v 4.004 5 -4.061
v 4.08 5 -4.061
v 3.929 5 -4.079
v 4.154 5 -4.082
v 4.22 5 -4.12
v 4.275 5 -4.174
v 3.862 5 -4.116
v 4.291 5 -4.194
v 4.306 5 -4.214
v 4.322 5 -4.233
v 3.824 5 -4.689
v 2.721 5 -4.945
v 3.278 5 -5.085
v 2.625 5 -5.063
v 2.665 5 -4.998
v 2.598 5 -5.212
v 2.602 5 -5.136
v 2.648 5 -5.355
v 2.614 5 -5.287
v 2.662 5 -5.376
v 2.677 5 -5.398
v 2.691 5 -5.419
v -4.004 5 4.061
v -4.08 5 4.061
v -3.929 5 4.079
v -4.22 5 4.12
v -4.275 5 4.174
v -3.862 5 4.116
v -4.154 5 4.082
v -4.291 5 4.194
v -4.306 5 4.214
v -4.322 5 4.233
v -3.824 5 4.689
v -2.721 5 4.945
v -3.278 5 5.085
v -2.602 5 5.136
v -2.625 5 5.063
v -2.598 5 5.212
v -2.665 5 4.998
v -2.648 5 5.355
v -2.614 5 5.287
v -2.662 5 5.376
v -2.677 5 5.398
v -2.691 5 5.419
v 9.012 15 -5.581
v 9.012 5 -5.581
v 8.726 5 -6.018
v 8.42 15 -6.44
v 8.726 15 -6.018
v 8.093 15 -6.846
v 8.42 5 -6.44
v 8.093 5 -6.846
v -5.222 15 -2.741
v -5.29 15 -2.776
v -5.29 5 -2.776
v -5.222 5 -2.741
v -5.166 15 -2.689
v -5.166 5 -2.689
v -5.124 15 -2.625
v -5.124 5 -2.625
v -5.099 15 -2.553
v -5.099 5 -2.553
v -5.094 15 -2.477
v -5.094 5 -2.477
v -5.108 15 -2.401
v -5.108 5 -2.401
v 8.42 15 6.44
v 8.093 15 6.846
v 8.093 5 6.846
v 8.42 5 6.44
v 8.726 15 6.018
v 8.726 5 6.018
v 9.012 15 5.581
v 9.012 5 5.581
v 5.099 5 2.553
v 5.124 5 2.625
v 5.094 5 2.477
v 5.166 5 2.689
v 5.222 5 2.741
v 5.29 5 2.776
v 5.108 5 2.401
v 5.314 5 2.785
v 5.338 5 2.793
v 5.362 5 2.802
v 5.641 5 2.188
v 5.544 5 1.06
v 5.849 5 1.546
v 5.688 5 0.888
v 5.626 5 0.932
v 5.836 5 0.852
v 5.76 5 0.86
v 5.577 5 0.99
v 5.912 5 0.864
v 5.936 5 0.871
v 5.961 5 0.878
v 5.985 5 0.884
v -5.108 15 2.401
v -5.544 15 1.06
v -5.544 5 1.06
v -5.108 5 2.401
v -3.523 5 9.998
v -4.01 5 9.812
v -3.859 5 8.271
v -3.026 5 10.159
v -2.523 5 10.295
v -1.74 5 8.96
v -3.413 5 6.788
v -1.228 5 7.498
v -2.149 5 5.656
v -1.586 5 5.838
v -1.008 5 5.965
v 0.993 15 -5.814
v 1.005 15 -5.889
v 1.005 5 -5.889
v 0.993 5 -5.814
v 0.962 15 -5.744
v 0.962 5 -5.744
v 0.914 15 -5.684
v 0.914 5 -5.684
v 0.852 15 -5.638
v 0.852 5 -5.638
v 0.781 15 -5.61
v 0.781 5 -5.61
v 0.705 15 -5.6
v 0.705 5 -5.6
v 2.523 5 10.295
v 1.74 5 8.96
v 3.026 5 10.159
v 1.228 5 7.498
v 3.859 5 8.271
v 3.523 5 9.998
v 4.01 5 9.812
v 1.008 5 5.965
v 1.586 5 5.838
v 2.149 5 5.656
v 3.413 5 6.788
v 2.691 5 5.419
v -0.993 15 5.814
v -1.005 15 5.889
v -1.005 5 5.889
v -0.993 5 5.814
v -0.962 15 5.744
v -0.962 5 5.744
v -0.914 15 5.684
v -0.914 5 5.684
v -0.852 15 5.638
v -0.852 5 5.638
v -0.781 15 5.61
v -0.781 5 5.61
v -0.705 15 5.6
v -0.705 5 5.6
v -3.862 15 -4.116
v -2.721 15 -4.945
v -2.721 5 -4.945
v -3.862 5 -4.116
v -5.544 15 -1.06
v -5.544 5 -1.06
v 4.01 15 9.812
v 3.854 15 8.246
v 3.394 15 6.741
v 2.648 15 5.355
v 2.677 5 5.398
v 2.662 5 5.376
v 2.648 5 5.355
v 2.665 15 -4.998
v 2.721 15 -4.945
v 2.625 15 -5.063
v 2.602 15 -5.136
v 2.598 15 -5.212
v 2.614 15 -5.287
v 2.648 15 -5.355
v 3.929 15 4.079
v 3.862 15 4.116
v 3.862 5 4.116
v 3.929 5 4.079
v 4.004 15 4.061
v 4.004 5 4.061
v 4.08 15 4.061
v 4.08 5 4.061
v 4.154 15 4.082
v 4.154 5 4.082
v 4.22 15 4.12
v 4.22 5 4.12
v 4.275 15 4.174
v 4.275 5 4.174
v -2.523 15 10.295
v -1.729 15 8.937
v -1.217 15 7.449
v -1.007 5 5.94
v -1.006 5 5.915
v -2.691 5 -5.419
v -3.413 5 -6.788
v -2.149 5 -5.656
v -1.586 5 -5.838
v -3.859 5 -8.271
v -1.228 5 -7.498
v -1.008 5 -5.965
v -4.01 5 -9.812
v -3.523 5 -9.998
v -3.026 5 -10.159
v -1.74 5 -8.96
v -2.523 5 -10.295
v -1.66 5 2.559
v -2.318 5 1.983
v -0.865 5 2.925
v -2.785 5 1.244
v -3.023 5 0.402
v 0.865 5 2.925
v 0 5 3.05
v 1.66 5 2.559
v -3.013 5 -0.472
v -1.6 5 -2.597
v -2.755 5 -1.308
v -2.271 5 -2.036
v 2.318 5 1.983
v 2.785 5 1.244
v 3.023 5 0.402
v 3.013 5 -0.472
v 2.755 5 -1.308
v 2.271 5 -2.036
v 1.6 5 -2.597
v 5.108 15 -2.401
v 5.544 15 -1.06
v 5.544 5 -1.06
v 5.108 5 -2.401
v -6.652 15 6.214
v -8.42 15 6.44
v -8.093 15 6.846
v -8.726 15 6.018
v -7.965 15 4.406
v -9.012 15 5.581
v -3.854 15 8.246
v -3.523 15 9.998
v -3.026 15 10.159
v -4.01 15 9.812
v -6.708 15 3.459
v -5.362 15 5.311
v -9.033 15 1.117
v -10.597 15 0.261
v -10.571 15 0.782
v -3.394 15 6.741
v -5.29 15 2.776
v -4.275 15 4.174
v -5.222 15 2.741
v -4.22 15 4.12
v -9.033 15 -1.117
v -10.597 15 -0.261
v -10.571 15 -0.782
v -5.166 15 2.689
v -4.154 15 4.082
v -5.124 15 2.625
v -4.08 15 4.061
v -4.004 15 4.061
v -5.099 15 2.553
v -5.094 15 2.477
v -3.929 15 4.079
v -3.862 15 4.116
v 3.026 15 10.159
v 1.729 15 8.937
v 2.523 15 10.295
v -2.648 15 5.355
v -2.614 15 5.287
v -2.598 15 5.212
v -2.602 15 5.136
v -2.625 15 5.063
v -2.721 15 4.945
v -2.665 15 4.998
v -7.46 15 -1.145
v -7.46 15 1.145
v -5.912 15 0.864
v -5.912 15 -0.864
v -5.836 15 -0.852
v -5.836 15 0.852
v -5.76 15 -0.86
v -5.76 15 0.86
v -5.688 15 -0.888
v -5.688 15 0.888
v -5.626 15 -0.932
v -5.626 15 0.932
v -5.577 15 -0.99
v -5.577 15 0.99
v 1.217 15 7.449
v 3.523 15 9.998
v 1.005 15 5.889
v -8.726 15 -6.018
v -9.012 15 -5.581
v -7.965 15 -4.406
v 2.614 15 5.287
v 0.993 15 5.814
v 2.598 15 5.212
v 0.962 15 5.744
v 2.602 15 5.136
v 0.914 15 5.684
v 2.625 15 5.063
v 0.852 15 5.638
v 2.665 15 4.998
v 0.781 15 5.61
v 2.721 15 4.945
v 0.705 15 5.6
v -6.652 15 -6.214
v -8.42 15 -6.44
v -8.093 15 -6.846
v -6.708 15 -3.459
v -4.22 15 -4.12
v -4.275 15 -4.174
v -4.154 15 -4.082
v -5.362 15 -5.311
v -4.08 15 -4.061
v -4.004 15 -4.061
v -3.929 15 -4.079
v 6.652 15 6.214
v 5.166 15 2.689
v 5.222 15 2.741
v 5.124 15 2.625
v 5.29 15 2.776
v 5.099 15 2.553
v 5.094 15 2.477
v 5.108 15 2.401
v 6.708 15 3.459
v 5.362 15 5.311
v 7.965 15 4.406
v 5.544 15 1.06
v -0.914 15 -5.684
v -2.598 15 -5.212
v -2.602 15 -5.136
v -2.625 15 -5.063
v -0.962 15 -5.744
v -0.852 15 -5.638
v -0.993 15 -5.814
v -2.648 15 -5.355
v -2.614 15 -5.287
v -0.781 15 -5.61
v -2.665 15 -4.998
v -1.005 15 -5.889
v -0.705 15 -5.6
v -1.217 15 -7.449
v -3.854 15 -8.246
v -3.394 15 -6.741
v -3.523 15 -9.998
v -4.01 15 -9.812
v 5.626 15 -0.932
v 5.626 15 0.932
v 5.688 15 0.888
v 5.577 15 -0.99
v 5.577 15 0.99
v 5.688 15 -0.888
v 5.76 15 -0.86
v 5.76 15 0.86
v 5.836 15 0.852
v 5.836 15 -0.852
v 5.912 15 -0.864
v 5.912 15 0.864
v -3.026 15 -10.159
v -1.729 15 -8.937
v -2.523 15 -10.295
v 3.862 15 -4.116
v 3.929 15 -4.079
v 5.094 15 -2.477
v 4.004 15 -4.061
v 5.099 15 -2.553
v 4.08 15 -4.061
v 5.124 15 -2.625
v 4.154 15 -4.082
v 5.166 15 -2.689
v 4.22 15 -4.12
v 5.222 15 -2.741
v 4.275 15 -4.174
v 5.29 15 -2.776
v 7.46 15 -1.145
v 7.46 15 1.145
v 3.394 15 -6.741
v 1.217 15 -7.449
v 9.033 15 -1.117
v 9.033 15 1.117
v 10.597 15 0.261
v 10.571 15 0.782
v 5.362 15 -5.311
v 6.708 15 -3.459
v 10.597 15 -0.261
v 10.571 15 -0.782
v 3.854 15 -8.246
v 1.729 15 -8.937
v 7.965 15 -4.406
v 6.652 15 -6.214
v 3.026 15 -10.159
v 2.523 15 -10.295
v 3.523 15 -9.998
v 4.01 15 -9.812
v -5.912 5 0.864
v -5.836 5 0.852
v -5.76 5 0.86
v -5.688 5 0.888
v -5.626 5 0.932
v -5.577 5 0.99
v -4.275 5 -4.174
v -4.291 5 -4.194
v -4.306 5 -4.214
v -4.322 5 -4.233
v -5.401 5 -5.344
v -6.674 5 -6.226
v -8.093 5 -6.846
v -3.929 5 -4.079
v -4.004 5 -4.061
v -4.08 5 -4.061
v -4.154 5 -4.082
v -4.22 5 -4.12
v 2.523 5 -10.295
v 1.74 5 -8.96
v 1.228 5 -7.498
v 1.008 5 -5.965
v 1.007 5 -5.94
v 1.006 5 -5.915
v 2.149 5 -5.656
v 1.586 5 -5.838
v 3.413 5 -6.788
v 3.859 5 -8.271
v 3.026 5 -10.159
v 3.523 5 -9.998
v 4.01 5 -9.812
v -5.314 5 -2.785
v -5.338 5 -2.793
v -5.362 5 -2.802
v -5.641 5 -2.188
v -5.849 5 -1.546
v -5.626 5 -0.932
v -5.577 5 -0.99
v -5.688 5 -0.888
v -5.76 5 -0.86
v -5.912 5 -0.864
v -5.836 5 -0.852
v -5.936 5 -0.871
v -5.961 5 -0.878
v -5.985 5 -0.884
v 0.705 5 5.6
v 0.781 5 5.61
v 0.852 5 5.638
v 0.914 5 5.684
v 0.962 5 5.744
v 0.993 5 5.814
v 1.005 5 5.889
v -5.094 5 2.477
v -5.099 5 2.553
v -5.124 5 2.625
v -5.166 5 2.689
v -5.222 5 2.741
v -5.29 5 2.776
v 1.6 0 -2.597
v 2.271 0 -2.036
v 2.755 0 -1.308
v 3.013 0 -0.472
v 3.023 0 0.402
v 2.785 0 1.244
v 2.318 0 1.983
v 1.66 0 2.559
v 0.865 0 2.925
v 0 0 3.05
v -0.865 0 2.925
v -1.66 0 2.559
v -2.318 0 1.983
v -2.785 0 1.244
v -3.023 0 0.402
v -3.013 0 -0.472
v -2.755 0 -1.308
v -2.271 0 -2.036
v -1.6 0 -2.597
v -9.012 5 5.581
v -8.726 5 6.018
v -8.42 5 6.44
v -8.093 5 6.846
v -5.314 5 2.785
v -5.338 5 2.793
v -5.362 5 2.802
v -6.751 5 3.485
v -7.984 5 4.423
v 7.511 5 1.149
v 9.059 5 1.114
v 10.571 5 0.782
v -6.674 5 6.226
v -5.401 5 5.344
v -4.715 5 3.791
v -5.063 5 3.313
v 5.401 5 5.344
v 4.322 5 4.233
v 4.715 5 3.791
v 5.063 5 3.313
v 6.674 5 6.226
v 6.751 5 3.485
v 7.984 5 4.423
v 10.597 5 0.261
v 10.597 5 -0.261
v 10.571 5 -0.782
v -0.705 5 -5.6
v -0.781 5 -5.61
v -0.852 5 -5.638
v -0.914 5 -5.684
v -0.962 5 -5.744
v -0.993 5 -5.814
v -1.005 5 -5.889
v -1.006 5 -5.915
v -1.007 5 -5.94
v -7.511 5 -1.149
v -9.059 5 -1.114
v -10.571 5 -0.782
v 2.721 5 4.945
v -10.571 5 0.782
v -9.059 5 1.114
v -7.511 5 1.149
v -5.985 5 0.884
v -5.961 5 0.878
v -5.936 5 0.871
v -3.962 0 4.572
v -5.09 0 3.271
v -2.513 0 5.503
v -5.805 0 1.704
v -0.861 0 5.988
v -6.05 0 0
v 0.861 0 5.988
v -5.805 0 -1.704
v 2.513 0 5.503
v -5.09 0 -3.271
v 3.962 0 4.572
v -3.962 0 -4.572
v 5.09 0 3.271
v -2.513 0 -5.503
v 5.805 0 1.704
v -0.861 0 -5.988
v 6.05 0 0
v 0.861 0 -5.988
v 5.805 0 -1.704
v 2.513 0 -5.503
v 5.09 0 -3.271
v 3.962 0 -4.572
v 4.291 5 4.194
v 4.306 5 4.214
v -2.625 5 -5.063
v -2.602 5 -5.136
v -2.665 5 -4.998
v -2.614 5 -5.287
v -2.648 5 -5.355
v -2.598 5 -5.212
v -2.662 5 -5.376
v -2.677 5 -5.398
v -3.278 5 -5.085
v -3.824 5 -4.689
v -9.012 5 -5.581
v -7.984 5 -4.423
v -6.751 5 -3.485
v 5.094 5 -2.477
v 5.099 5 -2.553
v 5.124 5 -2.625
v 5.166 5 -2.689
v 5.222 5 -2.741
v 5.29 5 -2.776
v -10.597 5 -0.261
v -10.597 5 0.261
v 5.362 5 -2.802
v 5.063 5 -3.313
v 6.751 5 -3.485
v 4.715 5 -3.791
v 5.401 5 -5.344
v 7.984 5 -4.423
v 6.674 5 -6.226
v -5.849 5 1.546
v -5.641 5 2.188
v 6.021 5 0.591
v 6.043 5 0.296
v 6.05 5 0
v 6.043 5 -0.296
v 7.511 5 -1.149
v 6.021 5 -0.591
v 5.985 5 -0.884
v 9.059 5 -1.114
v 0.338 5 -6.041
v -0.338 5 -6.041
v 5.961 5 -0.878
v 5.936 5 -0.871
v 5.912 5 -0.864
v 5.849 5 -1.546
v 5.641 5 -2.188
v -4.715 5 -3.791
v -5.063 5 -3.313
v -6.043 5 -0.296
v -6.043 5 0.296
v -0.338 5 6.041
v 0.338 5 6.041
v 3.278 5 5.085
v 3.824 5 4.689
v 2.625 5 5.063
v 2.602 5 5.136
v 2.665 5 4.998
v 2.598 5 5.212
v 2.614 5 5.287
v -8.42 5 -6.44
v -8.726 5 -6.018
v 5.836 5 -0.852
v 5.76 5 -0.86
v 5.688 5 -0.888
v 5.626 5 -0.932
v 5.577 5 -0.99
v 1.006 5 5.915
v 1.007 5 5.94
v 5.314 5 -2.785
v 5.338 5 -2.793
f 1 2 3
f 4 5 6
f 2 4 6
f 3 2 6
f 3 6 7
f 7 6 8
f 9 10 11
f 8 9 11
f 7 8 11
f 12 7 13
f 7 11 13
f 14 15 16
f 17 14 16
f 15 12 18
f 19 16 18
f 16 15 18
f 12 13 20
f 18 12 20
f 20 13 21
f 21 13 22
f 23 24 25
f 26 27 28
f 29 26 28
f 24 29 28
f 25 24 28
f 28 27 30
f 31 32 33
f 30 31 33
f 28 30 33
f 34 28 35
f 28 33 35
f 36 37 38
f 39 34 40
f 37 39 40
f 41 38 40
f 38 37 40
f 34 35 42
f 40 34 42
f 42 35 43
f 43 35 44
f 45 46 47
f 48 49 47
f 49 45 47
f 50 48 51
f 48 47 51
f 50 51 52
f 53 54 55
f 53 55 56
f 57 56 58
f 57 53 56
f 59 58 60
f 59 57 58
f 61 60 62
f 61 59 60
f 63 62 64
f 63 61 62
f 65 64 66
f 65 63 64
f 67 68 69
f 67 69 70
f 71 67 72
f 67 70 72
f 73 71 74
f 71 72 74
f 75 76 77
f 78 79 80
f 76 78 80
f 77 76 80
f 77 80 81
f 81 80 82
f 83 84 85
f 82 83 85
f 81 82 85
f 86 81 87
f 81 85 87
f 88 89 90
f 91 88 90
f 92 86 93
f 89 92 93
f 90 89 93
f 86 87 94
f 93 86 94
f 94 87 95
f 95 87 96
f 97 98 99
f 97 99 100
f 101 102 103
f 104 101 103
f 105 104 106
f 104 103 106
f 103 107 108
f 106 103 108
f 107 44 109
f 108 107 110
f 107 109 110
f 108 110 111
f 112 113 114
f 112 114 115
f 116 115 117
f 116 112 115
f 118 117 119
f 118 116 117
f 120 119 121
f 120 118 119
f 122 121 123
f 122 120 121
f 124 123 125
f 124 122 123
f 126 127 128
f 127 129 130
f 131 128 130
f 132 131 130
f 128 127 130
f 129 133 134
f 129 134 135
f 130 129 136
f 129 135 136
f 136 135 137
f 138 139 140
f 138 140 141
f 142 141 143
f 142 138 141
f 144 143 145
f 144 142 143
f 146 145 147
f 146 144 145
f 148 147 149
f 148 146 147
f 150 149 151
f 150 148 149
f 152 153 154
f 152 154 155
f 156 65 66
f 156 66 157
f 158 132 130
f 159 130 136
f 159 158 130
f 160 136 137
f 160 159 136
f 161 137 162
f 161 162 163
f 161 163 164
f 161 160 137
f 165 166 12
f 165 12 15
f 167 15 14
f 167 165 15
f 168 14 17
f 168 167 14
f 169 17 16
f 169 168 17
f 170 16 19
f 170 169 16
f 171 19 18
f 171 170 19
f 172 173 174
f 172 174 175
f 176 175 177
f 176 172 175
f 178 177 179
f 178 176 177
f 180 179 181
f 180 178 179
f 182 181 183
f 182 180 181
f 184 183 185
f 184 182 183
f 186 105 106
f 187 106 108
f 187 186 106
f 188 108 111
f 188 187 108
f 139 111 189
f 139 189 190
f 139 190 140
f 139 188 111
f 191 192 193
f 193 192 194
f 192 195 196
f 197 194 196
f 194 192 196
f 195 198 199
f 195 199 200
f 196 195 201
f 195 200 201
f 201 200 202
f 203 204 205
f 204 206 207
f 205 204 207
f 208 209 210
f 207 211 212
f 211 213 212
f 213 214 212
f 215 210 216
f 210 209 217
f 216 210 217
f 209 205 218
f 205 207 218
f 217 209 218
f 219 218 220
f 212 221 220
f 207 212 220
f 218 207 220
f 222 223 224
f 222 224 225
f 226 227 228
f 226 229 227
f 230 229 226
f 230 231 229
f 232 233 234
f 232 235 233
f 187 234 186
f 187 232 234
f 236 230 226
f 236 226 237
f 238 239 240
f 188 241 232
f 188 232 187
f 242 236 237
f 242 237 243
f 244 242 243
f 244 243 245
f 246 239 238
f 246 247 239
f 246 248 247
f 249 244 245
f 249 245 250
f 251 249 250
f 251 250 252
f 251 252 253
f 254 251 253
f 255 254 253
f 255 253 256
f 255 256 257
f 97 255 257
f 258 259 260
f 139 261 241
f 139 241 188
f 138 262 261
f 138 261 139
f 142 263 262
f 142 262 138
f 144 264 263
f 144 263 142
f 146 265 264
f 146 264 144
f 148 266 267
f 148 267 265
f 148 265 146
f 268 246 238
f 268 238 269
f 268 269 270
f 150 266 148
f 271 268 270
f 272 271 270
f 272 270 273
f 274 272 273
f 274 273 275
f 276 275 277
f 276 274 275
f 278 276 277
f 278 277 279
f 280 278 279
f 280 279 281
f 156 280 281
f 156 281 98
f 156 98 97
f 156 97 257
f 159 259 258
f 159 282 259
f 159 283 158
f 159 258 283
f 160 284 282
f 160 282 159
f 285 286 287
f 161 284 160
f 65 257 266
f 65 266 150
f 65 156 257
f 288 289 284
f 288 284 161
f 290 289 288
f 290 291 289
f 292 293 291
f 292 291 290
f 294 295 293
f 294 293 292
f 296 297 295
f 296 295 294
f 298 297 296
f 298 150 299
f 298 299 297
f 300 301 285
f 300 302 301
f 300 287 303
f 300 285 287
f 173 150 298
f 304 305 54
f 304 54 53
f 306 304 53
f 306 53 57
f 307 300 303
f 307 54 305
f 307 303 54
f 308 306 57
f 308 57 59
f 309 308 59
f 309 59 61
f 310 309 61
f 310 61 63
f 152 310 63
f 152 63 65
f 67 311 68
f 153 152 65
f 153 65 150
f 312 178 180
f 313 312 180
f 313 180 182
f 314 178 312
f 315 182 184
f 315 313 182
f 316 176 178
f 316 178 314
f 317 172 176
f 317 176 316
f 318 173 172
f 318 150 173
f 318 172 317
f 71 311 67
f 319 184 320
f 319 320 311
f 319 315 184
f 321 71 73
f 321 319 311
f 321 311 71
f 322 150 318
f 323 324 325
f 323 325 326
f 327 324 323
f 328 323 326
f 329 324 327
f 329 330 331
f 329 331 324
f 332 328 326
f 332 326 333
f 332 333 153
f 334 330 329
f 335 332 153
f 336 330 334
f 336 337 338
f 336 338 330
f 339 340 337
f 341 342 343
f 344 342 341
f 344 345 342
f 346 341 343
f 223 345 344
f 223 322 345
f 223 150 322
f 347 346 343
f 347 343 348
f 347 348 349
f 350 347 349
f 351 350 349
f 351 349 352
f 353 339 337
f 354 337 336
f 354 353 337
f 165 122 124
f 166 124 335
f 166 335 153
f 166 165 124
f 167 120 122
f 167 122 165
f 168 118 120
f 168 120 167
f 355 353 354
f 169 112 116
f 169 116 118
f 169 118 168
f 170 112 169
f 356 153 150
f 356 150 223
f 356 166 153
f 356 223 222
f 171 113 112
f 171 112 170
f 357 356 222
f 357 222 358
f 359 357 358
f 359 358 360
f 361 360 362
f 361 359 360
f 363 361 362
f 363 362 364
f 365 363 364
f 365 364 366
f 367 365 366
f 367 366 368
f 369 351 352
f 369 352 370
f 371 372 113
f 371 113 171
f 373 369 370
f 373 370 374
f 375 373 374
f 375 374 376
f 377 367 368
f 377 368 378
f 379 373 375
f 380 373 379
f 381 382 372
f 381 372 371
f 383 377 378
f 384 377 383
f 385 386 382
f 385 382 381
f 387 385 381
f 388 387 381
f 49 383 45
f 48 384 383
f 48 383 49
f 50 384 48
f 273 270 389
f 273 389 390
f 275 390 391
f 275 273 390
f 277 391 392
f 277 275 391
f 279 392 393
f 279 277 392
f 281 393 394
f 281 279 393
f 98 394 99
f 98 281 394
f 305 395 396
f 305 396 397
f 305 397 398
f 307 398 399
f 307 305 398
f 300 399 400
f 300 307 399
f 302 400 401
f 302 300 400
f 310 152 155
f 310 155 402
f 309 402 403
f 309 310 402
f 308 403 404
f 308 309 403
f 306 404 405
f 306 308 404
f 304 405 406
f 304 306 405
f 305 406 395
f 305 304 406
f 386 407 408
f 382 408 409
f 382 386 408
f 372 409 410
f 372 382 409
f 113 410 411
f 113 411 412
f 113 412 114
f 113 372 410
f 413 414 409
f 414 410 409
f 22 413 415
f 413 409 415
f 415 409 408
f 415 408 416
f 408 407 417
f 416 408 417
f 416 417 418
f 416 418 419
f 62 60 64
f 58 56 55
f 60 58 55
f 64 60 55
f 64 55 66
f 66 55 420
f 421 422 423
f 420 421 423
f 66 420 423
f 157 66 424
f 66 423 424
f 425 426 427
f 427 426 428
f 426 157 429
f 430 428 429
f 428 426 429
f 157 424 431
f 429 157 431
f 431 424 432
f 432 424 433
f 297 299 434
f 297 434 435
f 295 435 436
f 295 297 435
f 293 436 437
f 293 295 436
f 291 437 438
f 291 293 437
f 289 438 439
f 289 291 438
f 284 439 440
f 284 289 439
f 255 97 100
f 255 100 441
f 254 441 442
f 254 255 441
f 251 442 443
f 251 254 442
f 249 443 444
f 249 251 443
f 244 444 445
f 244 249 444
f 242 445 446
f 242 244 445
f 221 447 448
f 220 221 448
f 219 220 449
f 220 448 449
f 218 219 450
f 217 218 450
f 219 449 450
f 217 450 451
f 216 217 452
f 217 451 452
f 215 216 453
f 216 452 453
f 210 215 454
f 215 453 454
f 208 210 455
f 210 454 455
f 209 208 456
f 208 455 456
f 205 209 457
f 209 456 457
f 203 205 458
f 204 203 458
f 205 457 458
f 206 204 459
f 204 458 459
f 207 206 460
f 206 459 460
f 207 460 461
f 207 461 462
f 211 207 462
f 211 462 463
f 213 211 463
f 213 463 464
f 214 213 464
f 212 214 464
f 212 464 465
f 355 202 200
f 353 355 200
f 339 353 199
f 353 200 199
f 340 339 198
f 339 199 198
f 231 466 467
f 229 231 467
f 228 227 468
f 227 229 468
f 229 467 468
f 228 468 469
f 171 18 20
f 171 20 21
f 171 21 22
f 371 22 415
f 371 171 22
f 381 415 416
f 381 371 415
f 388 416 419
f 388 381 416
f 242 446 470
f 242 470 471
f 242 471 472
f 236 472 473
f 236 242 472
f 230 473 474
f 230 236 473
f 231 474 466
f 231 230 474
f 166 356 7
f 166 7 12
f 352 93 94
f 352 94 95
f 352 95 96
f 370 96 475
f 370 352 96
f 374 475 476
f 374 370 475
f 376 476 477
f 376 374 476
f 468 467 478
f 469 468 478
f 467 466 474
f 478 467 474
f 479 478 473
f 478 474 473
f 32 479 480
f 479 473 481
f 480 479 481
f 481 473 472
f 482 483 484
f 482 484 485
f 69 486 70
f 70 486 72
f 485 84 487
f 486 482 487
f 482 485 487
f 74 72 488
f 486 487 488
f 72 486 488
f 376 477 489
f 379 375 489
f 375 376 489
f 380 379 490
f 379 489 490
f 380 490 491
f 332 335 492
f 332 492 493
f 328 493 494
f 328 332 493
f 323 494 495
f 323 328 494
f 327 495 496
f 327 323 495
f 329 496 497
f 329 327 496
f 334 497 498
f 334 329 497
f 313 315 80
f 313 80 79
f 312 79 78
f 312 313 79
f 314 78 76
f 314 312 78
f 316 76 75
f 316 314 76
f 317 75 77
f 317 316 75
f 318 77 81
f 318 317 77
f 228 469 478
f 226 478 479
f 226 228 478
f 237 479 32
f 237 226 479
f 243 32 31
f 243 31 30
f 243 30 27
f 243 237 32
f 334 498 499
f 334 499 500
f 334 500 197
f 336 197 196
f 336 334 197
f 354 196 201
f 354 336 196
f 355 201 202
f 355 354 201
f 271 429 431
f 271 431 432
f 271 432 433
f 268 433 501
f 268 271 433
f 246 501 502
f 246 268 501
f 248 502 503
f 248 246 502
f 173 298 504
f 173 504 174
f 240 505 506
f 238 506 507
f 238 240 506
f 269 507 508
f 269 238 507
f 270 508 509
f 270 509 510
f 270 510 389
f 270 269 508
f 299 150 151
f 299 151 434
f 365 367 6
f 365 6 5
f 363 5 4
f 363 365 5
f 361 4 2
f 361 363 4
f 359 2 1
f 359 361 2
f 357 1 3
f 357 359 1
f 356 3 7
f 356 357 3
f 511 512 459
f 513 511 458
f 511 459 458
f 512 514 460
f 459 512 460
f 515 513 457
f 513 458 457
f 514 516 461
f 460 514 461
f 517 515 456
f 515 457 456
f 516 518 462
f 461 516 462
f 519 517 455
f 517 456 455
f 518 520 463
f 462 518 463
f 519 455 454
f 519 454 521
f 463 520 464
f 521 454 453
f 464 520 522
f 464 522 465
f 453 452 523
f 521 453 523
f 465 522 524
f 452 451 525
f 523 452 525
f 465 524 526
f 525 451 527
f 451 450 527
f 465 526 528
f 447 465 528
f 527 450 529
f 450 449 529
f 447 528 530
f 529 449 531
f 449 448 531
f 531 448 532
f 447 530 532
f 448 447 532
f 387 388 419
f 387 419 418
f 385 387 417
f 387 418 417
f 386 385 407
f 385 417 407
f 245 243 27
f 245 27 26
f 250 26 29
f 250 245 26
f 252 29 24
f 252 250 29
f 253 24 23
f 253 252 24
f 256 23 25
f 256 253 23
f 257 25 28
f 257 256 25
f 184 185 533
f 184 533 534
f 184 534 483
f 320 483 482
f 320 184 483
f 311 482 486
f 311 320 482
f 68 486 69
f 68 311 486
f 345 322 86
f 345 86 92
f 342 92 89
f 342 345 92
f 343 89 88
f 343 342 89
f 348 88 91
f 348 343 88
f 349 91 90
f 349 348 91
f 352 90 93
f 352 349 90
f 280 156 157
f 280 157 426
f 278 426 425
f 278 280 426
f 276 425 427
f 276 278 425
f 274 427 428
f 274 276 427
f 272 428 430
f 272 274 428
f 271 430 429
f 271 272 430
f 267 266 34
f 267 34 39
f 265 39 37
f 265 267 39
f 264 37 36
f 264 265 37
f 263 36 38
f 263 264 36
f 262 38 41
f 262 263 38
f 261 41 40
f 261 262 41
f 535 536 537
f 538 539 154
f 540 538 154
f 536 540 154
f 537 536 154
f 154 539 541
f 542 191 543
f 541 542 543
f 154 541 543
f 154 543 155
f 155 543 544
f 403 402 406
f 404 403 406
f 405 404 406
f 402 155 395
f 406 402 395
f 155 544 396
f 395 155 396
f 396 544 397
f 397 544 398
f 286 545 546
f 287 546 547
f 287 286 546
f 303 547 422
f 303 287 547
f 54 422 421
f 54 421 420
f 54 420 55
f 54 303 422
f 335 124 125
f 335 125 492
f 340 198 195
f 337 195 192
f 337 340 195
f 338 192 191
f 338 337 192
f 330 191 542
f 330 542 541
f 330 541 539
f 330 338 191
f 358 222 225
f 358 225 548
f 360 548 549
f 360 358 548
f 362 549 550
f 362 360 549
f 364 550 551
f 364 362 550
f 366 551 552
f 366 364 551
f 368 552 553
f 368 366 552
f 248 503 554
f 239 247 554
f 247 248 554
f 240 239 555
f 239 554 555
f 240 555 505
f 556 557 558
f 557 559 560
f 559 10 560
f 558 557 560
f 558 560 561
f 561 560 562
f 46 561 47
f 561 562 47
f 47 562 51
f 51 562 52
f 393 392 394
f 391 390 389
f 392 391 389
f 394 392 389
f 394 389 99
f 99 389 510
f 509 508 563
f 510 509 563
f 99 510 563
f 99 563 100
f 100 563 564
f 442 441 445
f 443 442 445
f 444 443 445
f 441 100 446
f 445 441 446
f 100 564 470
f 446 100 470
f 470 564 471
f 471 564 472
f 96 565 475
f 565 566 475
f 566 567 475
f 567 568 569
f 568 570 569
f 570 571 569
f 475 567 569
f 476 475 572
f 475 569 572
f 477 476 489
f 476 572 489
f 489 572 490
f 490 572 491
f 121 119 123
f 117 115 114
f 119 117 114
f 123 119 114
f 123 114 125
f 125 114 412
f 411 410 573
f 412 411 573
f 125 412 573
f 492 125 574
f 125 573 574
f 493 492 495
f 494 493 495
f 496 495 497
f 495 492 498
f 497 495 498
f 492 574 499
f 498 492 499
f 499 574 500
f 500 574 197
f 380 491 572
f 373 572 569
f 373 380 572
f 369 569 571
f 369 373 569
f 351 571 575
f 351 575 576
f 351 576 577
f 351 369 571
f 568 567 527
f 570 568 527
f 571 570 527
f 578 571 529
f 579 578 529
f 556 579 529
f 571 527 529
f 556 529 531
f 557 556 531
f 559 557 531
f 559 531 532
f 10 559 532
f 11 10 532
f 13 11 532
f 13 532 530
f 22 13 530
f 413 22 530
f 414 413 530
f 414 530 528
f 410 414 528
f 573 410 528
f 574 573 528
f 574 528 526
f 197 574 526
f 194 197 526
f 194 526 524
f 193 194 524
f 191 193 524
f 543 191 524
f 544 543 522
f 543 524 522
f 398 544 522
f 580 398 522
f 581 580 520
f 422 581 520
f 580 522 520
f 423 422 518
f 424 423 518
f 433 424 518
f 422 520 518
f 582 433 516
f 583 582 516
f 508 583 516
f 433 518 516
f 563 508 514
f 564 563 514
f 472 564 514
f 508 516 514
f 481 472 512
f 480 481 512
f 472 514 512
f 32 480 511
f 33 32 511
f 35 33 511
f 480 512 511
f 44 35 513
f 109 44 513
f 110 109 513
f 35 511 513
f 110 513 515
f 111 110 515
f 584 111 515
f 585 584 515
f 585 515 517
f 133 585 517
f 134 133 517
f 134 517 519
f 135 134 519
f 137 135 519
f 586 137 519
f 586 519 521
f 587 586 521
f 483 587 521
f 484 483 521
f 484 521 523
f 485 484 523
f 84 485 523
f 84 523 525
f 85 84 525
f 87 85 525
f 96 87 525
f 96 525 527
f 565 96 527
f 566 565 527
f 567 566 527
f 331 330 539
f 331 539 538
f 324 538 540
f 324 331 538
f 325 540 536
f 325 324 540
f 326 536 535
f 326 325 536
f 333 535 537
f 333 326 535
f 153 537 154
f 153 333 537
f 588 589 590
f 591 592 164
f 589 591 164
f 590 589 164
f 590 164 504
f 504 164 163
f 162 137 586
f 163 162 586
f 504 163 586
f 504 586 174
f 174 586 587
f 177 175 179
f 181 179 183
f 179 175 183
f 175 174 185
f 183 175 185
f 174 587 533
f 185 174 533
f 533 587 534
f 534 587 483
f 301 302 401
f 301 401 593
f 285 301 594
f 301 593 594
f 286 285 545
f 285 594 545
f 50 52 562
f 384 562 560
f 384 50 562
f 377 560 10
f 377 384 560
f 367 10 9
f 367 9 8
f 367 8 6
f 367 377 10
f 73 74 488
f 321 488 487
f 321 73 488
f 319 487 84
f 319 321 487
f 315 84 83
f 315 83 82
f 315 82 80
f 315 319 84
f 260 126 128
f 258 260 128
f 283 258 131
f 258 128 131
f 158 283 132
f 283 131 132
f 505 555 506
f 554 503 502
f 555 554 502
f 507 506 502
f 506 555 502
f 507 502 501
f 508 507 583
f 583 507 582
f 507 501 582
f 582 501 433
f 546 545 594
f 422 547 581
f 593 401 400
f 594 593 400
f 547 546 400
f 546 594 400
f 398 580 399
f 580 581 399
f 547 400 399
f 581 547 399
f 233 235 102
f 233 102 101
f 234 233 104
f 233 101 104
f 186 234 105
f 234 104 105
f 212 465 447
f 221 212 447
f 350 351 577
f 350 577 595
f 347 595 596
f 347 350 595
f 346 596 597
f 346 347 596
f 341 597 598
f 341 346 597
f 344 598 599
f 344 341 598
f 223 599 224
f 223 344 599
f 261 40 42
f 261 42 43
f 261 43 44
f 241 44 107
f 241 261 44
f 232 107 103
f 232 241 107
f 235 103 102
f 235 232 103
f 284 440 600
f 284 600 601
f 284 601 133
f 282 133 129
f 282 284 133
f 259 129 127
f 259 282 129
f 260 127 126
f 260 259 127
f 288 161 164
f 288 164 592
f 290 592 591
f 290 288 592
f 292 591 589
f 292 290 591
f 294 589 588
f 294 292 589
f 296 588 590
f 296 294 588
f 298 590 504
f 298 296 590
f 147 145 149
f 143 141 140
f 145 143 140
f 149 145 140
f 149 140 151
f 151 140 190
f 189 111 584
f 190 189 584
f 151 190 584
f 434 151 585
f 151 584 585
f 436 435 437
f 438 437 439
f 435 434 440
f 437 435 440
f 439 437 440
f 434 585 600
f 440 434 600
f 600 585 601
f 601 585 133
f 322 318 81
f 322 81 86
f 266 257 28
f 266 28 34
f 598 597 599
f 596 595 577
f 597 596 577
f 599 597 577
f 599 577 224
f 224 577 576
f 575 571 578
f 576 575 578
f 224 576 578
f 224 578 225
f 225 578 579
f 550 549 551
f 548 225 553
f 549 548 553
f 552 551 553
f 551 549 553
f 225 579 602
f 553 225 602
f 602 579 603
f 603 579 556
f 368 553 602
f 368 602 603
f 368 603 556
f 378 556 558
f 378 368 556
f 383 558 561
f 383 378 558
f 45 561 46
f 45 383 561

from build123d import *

# Parameters (mm, degrees)
SKETCH1_R           = 6.05
BOSS_EXTRUDE1_DEPTH = 5
SKETCH2_R           = 10.6
BOSS_EXTRUDE2_DEPTH = 10
CUT_EXTRUDE1_DEPTH  = 10
CIRPATTERN1_COUNT   = 10


with BuildPart() as part:
    # Sketch1 → Boss-Extrude1 (new body)
    with BuildSketch(Plane(origin=(0, 0, 0), x_dir=(1, 0, 0), z_dir=(0, 1, 0))):
        Circle(SKETCH1_R)
        with BuildLine():
            Line((-1.6, 2.596632435), (1.6, 2.596632435))
            ThreePointArc((1.6, 2.596632435), (0, -3.05), (-1.6, 2.596632435))
        make_face(mode=Mode.SUBTRACT)
    extrude(amount=BOSS_EXTRUDE1_DEPTH)

    # Sketch2 → Boss-Extrude2 (add)
    with BuildSketch(Plane(origin=(0, 5, 0), x_dir=(1, 0, 0), z_dir=(0, 1, 0))):
        Circle(SKETCH2_R)
    extrude(amount=BOSS_EXTRUDE2_DEPTH)

    # Sketch3 → Cut-Extrude1 (cut)
    with BuildSketch(Plane(origin=(0, 15, 0), x_dir=(1, 0, 0), z_dir=(0, 1, 0))):
        with BuildLine():
            Line((0.705423459, 5.6), (-0.705423459, 5.6))
            ThreePointArc((-0.705423459, 5.6), (-0.913686499, 5.684068284), (-1.00522743, 5.889156627))
            ThreePointArc((-1.00522743, 5.889156627), (-3.446318924, 11.358179096), (-9, 13.6))
            Line((-9, 13.6), (9, 13.6))
            ThreePointArc((9, 13.6), (3.446318924, 11.358179096), (1.00522743, 5.889156627))
            ThreePointArc((1.00522743, 5.889156627), (0.913686499, 5.684068284), (0.705423459, 5.6))
        make_face()
    cut_extrude1 = extrude(amount=-CUT_EXTRUDE1_DEPTH, mode=Mode.SUBTRACT)

    # CirPattern1: Cut-Extrude1 ×10 about axis
    cirpattern1_axis = Axis((0, 0, 0), (0, 1, 0))
    for i in range(1, CIRPATTERN1_COUNT):
        add(cut_extrude1.rotate(cirpattern1_axis, i * 360 / CIRPATTERN1_COUNT), mode=Mode.SUBTRACT)


solid = part.part
